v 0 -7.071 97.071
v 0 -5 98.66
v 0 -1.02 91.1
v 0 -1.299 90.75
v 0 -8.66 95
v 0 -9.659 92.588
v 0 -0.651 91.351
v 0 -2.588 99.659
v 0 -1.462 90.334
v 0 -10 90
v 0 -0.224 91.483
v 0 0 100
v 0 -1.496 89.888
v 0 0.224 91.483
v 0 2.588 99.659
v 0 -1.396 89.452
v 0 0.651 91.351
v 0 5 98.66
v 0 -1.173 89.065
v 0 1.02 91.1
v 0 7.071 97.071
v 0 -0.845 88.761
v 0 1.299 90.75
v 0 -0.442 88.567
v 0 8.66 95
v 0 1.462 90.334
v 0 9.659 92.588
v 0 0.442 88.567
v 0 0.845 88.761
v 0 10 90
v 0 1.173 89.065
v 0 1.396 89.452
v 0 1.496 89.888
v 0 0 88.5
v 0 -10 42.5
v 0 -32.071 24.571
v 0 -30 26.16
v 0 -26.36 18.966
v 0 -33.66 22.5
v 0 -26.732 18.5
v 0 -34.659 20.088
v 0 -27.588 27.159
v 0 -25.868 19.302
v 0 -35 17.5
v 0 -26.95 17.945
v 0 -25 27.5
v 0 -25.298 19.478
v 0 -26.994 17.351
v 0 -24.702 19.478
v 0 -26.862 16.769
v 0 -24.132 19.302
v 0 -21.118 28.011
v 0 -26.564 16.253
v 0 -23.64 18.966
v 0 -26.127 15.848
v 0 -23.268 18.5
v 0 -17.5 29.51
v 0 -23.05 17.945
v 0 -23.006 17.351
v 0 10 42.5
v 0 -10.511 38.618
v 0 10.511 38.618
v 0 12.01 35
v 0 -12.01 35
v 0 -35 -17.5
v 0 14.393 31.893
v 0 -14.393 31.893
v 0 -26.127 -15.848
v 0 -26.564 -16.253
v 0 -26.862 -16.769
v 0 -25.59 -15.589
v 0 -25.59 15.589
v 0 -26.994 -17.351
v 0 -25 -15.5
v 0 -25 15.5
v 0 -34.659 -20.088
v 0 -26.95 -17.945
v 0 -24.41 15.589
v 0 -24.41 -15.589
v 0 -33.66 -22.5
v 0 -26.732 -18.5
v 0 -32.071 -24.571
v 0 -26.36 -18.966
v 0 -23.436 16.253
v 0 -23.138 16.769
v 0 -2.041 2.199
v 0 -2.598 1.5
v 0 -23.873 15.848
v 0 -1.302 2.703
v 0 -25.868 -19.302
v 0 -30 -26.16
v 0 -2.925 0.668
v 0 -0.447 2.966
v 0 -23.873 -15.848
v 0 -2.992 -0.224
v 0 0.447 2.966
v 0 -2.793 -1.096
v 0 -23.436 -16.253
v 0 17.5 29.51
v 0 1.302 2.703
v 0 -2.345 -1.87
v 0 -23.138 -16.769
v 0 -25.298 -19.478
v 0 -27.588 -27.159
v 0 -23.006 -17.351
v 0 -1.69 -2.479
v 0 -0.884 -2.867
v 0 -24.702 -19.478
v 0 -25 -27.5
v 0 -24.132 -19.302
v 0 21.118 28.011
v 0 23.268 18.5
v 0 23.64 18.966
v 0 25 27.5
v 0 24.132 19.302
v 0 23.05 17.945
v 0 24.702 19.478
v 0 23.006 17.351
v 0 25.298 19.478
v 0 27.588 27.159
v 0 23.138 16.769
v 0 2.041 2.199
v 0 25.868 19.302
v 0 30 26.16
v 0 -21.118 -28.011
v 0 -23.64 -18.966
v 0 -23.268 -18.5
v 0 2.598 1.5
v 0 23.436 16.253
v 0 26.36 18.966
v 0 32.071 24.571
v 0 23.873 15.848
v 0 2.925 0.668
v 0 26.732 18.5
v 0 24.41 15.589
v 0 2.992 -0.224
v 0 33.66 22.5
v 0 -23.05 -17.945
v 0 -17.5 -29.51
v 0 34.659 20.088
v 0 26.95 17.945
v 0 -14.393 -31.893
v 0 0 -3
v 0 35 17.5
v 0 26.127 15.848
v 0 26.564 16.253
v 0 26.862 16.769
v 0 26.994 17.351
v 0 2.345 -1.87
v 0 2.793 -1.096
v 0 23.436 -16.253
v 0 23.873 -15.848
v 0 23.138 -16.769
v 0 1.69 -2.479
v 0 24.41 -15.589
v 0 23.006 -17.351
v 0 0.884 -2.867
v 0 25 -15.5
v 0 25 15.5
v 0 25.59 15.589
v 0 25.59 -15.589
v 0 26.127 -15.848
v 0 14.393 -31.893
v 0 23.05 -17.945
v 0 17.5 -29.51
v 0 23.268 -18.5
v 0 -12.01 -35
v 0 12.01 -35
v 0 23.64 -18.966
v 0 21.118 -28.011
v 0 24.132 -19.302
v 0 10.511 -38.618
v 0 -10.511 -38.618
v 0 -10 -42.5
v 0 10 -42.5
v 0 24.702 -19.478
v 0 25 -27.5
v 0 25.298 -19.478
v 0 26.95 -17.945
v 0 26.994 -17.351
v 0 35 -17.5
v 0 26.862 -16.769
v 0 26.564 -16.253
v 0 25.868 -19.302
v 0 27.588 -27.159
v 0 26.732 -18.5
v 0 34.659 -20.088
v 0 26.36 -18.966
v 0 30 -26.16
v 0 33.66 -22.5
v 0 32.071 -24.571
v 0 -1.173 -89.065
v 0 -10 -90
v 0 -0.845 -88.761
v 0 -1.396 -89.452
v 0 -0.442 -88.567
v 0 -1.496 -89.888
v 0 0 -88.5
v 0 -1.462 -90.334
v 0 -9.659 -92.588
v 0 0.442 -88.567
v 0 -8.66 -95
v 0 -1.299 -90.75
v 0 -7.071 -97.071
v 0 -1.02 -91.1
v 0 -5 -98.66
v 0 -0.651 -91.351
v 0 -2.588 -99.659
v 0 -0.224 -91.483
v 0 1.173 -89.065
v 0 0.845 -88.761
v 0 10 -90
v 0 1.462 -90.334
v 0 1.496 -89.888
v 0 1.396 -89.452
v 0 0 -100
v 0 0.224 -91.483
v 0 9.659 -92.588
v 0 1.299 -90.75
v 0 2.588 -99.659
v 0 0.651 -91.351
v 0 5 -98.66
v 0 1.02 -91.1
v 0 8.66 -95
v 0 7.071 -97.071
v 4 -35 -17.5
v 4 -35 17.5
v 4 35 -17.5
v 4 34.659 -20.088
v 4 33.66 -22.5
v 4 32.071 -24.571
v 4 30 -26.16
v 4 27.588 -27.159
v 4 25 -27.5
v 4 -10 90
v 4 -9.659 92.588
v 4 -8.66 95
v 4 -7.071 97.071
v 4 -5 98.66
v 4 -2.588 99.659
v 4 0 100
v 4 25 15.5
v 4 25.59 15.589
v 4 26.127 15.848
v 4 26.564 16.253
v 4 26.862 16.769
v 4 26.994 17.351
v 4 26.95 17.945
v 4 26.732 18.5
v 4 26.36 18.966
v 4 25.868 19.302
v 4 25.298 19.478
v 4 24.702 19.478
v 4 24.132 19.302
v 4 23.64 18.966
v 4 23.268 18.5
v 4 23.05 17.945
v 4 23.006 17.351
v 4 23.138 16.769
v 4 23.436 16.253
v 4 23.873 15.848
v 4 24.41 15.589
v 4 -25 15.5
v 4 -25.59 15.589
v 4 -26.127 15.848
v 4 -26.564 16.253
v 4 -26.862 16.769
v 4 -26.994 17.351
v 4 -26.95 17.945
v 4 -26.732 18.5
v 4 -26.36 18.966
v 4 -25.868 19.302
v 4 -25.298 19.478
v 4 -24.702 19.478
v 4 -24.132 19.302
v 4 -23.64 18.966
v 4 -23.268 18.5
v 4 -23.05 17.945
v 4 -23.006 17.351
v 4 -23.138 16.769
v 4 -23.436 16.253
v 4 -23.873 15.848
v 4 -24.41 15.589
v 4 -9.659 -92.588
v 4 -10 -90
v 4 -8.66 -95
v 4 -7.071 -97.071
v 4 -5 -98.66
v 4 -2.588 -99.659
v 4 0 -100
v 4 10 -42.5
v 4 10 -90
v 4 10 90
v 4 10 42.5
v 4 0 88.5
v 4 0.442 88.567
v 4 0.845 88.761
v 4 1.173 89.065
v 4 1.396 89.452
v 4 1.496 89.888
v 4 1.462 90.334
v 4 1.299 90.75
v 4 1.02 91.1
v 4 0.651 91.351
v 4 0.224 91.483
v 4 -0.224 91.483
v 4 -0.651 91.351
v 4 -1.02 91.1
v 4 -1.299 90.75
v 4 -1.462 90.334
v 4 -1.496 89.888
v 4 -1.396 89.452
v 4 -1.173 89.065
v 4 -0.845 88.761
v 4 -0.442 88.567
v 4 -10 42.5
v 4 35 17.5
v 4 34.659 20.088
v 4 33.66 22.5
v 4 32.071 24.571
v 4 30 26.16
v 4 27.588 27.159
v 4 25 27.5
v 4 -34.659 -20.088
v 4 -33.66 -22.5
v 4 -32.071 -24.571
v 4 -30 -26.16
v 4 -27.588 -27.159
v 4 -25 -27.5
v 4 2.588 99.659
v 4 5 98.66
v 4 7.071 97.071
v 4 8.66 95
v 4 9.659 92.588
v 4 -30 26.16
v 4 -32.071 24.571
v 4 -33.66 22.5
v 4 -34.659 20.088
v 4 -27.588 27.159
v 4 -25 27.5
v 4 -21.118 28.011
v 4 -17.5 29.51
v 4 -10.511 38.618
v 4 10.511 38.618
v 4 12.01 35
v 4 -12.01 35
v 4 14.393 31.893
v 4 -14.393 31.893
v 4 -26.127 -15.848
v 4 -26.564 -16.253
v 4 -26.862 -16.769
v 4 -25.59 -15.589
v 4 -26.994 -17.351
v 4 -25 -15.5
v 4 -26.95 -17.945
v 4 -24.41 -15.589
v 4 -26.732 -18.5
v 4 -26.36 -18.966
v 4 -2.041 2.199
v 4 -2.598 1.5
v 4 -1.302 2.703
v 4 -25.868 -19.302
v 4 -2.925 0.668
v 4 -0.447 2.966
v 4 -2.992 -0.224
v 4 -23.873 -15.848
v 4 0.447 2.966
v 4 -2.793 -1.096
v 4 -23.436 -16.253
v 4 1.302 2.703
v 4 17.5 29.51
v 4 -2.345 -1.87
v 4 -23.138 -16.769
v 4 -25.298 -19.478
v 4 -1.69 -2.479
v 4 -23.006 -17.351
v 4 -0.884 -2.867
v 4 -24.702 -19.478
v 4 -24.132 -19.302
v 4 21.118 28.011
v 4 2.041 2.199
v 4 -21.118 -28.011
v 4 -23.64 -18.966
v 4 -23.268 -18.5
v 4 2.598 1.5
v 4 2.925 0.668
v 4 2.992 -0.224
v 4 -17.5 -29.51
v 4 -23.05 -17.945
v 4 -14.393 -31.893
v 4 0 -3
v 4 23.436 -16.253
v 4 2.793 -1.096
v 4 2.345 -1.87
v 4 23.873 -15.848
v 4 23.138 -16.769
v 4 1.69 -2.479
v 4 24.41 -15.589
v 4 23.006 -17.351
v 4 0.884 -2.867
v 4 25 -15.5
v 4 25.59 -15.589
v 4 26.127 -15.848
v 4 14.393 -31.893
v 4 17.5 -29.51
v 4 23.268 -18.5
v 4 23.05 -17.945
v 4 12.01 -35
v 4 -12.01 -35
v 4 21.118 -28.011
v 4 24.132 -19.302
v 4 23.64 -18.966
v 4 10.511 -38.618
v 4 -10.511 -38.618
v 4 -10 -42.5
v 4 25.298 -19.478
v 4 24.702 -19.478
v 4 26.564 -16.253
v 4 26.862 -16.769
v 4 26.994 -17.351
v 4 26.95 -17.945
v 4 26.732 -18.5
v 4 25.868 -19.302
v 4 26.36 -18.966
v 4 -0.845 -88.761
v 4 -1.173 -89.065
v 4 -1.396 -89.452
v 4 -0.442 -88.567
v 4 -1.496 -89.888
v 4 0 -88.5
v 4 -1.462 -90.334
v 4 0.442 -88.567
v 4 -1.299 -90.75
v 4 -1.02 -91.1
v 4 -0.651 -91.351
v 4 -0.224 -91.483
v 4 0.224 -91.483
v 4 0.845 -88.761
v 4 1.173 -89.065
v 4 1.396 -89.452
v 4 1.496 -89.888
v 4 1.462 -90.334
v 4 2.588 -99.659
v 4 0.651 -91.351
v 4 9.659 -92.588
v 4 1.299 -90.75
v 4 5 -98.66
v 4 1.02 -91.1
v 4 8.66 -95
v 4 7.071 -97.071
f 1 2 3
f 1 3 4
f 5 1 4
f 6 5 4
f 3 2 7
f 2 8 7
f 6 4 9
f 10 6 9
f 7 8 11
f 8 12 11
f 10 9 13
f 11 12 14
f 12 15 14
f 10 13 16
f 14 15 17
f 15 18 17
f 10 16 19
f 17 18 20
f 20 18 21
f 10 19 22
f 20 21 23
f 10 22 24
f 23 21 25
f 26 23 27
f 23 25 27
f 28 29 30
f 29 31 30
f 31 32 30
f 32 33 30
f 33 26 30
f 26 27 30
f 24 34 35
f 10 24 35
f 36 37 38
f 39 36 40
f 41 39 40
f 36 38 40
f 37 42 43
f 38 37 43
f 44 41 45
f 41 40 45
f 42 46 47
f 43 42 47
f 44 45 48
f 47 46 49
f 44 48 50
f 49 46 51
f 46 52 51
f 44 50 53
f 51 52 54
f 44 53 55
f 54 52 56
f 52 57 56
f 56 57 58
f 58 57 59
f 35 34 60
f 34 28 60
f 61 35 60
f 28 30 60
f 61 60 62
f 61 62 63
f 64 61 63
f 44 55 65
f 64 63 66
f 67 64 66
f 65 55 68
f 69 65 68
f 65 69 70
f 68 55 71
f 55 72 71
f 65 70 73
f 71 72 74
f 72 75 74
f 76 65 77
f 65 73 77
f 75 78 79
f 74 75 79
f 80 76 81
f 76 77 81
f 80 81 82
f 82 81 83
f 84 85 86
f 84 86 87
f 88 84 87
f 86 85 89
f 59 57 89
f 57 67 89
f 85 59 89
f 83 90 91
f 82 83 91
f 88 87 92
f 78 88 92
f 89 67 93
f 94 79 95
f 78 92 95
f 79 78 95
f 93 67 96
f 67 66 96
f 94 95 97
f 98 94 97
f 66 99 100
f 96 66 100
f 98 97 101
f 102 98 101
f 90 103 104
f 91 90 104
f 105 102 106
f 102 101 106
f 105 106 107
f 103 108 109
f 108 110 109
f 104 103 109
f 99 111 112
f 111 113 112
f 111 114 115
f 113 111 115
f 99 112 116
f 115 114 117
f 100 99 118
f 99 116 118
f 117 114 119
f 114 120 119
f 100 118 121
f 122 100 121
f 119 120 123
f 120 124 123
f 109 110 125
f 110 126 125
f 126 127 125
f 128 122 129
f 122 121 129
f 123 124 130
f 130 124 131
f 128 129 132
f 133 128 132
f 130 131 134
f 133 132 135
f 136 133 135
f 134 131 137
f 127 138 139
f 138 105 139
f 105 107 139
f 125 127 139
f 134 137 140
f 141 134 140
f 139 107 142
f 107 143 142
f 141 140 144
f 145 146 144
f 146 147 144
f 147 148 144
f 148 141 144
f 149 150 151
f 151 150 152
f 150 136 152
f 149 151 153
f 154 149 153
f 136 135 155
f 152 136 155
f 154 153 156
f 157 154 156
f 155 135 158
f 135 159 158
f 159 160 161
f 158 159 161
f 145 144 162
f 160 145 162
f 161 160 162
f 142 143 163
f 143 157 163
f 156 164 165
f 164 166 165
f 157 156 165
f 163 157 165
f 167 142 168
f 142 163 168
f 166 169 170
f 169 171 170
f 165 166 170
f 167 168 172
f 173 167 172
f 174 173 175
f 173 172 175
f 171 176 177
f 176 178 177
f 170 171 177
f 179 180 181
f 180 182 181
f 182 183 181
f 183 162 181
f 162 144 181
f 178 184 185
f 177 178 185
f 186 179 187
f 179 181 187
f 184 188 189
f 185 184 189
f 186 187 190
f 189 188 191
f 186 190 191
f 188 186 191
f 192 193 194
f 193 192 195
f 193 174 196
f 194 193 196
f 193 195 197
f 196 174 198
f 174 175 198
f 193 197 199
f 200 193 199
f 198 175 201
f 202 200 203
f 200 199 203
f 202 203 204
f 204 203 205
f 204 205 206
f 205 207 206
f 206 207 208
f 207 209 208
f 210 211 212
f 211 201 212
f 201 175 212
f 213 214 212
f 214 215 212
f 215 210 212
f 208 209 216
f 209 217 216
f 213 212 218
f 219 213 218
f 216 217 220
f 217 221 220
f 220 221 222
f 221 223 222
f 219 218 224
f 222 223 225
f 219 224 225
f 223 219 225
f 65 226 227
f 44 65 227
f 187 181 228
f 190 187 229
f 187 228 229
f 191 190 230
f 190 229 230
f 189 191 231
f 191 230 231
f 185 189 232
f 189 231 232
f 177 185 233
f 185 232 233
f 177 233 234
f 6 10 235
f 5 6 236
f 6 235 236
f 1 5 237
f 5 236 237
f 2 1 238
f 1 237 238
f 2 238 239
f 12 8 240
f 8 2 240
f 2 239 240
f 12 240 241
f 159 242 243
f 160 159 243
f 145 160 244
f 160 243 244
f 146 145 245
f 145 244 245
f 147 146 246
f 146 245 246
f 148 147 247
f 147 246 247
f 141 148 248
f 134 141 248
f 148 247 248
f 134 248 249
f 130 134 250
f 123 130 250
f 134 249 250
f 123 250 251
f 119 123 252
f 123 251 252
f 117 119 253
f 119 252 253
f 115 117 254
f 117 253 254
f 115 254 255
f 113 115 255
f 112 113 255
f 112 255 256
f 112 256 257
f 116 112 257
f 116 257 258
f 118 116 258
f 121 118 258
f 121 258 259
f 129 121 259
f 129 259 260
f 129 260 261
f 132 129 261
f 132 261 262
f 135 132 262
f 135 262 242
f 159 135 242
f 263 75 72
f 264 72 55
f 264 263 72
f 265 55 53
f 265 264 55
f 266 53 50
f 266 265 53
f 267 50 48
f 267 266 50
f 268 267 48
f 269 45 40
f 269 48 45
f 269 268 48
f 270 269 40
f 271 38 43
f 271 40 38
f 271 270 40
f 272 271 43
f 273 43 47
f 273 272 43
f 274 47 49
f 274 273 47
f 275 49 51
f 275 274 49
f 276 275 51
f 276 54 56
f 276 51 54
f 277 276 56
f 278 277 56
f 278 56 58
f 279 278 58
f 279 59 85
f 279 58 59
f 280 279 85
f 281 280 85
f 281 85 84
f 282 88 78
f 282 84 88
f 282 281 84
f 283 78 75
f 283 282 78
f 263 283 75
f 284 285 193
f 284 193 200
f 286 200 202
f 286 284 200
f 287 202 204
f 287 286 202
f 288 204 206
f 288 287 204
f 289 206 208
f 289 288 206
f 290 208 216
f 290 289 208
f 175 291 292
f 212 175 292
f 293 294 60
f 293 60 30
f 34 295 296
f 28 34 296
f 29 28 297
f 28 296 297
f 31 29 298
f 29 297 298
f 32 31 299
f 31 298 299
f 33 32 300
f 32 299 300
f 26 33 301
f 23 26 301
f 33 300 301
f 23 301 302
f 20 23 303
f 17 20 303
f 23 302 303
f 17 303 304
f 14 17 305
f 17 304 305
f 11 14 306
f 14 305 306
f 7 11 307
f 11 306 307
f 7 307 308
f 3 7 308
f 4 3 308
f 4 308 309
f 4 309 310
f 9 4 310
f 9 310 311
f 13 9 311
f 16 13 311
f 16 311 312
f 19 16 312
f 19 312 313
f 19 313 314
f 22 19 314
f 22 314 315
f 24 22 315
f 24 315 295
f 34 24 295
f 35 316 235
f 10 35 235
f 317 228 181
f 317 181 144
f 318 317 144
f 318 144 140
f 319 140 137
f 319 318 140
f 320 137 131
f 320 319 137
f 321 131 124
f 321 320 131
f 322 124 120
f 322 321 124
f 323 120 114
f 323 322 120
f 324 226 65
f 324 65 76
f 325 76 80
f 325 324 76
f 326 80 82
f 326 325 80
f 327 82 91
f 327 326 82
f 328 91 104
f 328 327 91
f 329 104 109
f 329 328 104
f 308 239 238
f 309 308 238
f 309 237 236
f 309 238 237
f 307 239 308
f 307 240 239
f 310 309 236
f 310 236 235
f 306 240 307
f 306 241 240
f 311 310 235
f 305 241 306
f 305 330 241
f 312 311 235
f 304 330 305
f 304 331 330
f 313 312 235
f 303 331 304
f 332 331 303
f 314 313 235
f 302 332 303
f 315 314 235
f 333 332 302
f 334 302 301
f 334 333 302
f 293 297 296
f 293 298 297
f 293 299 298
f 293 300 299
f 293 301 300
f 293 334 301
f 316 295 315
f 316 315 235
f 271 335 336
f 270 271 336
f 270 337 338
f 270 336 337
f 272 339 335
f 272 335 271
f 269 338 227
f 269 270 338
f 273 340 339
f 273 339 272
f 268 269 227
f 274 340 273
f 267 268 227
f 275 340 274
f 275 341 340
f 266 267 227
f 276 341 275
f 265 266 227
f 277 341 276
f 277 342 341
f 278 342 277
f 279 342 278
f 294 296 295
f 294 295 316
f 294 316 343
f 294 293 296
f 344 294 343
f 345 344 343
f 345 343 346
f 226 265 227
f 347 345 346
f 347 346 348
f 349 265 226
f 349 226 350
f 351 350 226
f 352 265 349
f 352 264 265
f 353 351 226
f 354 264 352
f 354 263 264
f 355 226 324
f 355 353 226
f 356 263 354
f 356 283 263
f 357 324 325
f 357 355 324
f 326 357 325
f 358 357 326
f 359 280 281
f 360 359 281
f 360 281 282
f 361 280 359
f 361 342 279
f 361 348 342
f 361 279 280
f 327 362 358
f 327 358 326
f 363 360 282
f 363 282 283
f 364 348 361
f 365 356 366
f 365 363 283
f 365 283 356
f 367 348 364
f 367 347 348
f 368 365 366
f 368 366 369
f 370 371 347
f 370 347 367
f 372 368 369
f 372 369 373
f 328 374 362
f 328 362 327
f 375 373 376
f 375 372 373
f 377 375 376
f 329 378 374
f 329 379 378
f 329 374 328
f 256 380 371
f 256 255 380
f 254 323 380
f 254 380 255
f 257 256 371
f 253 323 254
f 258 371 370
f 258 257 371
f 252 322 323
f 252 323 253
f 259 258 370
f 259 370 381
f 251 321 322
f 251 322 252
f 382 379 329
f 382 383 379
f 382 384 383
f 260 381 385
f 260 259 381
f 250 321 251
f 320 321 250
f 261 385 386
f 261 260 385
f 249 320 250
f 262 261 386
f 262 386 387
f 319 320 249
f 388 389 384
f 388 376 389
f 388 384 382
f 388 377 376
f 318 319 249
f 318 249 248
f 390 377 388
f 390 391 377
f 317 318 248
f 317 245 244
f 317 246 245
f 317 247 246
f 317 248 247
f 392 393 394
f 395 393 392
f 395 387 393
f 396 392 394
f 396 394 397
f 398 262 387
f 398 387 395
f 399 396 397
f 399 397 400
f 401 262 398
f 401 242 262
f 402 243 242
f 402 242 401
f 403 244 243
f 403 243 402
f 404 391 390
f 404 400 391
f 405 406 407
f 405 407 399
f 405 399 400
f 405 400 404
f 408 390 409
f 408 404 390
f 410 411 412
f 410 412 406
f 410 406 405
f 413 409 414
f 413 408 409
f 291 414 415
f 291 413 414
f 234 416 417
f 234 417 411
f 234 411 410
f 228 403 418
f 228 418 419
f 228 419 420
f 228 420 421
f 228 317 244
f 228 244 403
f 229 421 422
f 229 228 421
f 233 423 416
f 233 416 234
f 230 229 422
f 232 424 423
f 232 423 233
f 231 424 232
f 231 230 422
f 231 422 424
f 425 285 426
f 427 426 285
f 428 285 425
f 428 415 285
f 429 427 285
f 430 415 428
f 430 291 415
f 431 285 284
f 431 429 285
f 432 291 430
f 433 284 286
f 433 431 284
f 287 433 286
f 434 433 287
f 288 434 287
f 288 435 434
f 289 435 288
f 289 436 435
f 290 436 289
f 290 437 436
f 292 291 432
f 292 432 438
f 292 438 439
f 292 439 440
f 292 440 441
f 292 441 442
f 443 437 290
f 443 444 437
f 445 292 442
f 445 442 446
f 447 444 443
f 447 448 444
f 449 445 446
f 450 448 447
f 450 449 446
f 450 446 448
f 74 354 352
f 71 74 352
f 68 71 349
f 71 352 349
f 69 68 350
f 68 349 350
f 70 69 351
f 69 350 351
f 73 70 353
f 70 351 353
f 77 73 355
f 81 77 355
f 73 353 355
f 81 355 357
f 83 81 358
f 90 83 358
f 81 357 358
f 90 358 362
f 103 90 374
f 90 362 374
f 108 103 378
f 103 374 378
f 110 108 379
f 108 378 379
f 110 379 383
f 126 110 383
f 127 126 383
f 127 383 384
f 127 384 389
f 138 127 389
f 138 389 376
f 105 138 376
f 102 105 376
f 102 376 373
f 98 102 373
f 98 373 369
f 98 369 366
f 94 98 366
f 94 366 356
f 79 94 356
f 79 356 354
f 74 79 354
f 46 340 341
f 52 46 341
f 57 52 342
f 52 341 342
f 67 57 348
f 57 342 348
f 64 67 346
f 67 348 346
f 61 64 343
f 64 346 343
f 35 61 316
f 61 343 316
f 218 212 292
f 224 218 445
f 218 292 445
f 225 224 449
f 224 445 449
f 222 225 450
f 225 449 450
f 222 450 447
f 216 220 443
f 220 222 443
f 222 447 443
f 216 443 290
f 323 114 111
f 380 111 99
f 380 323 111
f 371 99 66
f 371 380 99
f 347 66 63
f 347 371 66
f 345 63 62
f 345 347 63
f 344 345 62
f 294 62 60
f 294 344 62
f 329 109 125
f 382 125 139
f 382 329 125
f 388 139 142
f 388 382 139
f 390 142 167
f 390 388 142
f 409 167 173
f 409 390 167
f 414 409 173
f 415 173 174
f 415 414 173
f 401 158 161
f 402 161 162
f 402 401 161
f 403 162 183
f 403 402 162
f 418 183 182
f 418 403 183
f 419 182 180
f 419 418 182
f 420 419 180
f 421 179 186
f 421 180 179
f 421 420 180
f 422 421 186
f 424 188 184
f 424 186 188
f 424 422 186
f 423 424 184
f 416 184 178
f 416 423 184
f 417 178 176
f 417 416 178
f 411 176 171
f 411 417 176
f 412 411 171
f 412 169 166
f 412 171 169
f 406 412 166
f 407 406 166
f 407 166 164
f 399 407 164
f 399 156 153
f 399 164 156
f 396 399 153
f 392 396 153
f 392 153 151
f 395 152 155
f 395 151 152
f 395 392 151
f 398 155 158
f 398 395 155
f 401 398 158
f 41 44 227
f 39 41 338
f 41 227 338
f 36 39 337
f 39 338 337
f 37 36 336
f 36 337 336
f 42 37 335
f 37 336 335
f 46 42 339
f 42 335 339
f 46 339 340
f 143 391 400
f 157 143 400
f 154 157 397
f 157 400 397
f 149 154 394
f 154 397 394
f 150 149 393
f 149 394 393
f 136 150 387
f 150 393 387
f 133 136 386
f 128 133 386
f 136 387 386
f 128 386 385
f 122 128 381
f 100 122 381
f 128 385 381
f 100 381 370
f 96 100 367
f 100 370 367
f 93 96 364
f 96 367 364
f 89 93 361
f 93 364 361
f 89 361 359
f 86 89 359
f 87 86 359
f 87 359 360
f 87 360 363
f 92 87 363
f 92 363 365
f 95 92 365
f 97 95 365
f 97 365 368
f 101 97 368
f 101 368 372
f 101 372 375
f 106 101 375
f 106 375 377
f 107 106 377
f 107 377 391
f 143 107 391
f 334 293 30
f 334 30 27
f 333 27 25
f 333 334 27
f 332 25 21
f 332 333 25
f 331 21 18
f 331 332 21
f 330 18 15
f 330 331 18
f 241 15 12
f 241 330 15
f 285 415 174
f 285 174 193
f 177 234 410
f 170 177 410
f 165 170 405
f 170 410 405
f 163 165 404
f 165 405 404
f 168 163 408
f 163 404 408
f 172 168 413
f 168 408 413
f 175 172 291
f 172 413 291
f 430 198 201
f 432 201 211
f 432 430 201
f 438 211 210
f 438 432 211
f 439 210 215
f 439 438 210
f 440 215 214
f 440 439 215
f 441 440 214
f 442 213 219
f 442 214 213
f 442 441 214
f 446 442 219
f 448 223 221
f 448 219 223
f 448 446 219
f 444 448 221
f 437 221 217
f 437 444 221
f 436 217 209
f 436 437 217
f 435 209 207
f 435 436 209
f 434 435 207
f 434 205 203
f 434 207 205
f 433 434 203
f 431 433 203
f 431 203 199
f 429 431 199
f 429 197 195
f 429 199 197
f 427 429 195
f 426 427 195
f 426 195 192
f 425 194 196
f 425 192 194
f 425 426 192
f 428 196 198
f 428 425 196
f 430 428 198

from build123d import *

# Parameters (mm, degrees)
SKETCH1_W               = 210
SKETCH1_H               = 75
BOSS_EXTRUDE1_DEPTH     = 4
SKETCH2_R               = 1.5
CUT_EXTRUDE1_DEPTH      = 5
SKETCH3_R               = 2
CUT_EXTRUDE2_DEPTH      = 5
CUT_EXTRUDE3_DEPTH      = 5
MIRROR3_COPY_1_SKETCH_R = 2
MIRROR3_COPY_1_DEPTH    = 5
MIRROR3_COPY_2_DEPTH    = 5
SKETCH5_R               = 3
CUT_EXTRUDE4_DEPTH      = 5


with BuildPart() as part:
    # Sketch1 → Boss-Extrude1 (new body)
    with BuildSketch(Plane(origin=(0, 0, 0), x_dir=(0, 0, -1), z_dir=(1, 0, 0))):
        Rectangle(SKETCH1_W, SKETCH1_H)
    extrude(amount=BOSS_EXTRUDE1_DEPTH)

    # Sketch2 → Cut-Extrude1 (cut, through all)
    with BuildSketch(Plane(origin=(4, 0, 0), x_dir=(0, 0, -1), z_dir=(1, 0, 0))):
        with Locations((-90, 0)):
            Circle(SKETCH2_R)
    cut_extrude1 = extrude(amount=-CUT_EXTRUDE1_DEPTH, mode=Mode.SUBTRACT)

    # Sketch3 → Cut-Extrude2 (cut, through all)
    with BuildSketch(Plane(origin=(4, 0, 0), x_dir=(0, 0, -1), z_dir=(1, 0, 0))):
        with Locations((-17.5, 25)):
            Circle(SKETCH3_R)
    cut_extrude2 = extrude(amount=-CUT_EXTRUDE2_DEPTH, mode=Mode.SUBTRACT)

    # Sketch4 → Cut-Extrude3 (cut, through all)
    with BuildSketch(Plane(origin=(4, 0, 0), x_dir=(0, 0, -1), z_dir=(1, 0, 0))):
        with BuildLine():
            Line((-105, 0), (-105, 37.5))
            Line((-105, 37.5), (0, 37.5))
            Line((0, 37.5), (0, 35))
            Line((0, 35), (-17.5, 35))
            ThreePointArc((-17.5, 35), (-24.571067812, 32.071067812), (-27.5, 25))
            ThreePointArc((-27.5, 25), (-31.893398282, 14.393398282), (-42.5, 10))
            Line((-42.5, 10), (-90, 10))
            ThreePointArc((-90, 10), (-97.071067812, 7.071067812), (-100, 0))
            Line((-100, 0), (-105, 0))
        make_face()
    cut_extrude3 = extrude(amount=-CUT_EXTRUDE3_DEPTH, mode=Mode.SUBTRACT)

    # Mirror2: Cut-Extrude2, Cut-Extrude3 across plane
    add(cut_extrude2.mirror(Plane.ZX), mode=Mode.SUBTRACT)
    add(cut_extrude3.mirror(Plane.ZX), mode=Mode.SUBTRACT)

    # Mirror3: Cut-Extrude3, Cut-Extrude1, Cut-Extrude2 across plane
    add(cut_extrude3.mirror(Plane.XY), mode=Mode.SUBTRACT)
    add(cut_extrude1.mirror(Plane.XY), mode=Mode.SUBTRACT)
    add(cut_extrude2.mirror(Plane.XY), mode=Mode.SUBTRACT)

    # Mirror3 copy 1 sketch → Mirror3 copy 1 (cut, through all)
    with BuildSketch(Plane(origin=(4, 0, 0), x_dir=(0, 0, 1), z_dir=(1, 0, 0))):
        with Locations((-17.5, 25)):
            Circle(MIRROR3_COPY_1_SKETCH_R)
    extrude(amount=-MIRROR3_COPY_1_DEPTH, mode=Mode.SUBTRACT)

    # Mirror3 copy 2 sketch → Mirror3 copy 2 (cut, through all)
    with BuildSketch(Plane(origin=(4, 0, 0), x_dir=(0, 0, 1), z_dir=(1, 0, 0))):
        with BuildLine():
            Line((-105, 0), (-105, 37.5))
            Line((-105, 37.5), (0, 37.5))
            Line((0, 37.5), (0, 35))
            Line((0, 35), (-17.5, 35))
            ThreePointArc((-17.5, 35), (-24.571067812, 32.071067812), (-27.5, 25))
            ThreePointArc((-27.5, 25), (-31.893398282, 14.393398282), (-42.5, 10))
            Line((-42.5, 10), (-90, 10))
            ThreePointArc((-90, 10), (-97.071067812, 7.071067812), (-100, 0))
            Line((-100, 0), (-105, 0))
        make_face()
    extrude(amount=-MIRROR3_COPY_2_DEPTH, mode=Mode.SUBTRACT)

    # Sketch5 → Cut-Extrude4 (cut, through all)
    with BuildSketch(Plane(origin=(4, 0, 0), x_dir=(0, 0, -1), z_dir=(1, 0, 0))):
        Circle(SKETCH5_R)
    extrude(amount=-CUT_EXTRUDE4_DEPTH, mode=Mode.SUBTRACT)


solid = part.part
